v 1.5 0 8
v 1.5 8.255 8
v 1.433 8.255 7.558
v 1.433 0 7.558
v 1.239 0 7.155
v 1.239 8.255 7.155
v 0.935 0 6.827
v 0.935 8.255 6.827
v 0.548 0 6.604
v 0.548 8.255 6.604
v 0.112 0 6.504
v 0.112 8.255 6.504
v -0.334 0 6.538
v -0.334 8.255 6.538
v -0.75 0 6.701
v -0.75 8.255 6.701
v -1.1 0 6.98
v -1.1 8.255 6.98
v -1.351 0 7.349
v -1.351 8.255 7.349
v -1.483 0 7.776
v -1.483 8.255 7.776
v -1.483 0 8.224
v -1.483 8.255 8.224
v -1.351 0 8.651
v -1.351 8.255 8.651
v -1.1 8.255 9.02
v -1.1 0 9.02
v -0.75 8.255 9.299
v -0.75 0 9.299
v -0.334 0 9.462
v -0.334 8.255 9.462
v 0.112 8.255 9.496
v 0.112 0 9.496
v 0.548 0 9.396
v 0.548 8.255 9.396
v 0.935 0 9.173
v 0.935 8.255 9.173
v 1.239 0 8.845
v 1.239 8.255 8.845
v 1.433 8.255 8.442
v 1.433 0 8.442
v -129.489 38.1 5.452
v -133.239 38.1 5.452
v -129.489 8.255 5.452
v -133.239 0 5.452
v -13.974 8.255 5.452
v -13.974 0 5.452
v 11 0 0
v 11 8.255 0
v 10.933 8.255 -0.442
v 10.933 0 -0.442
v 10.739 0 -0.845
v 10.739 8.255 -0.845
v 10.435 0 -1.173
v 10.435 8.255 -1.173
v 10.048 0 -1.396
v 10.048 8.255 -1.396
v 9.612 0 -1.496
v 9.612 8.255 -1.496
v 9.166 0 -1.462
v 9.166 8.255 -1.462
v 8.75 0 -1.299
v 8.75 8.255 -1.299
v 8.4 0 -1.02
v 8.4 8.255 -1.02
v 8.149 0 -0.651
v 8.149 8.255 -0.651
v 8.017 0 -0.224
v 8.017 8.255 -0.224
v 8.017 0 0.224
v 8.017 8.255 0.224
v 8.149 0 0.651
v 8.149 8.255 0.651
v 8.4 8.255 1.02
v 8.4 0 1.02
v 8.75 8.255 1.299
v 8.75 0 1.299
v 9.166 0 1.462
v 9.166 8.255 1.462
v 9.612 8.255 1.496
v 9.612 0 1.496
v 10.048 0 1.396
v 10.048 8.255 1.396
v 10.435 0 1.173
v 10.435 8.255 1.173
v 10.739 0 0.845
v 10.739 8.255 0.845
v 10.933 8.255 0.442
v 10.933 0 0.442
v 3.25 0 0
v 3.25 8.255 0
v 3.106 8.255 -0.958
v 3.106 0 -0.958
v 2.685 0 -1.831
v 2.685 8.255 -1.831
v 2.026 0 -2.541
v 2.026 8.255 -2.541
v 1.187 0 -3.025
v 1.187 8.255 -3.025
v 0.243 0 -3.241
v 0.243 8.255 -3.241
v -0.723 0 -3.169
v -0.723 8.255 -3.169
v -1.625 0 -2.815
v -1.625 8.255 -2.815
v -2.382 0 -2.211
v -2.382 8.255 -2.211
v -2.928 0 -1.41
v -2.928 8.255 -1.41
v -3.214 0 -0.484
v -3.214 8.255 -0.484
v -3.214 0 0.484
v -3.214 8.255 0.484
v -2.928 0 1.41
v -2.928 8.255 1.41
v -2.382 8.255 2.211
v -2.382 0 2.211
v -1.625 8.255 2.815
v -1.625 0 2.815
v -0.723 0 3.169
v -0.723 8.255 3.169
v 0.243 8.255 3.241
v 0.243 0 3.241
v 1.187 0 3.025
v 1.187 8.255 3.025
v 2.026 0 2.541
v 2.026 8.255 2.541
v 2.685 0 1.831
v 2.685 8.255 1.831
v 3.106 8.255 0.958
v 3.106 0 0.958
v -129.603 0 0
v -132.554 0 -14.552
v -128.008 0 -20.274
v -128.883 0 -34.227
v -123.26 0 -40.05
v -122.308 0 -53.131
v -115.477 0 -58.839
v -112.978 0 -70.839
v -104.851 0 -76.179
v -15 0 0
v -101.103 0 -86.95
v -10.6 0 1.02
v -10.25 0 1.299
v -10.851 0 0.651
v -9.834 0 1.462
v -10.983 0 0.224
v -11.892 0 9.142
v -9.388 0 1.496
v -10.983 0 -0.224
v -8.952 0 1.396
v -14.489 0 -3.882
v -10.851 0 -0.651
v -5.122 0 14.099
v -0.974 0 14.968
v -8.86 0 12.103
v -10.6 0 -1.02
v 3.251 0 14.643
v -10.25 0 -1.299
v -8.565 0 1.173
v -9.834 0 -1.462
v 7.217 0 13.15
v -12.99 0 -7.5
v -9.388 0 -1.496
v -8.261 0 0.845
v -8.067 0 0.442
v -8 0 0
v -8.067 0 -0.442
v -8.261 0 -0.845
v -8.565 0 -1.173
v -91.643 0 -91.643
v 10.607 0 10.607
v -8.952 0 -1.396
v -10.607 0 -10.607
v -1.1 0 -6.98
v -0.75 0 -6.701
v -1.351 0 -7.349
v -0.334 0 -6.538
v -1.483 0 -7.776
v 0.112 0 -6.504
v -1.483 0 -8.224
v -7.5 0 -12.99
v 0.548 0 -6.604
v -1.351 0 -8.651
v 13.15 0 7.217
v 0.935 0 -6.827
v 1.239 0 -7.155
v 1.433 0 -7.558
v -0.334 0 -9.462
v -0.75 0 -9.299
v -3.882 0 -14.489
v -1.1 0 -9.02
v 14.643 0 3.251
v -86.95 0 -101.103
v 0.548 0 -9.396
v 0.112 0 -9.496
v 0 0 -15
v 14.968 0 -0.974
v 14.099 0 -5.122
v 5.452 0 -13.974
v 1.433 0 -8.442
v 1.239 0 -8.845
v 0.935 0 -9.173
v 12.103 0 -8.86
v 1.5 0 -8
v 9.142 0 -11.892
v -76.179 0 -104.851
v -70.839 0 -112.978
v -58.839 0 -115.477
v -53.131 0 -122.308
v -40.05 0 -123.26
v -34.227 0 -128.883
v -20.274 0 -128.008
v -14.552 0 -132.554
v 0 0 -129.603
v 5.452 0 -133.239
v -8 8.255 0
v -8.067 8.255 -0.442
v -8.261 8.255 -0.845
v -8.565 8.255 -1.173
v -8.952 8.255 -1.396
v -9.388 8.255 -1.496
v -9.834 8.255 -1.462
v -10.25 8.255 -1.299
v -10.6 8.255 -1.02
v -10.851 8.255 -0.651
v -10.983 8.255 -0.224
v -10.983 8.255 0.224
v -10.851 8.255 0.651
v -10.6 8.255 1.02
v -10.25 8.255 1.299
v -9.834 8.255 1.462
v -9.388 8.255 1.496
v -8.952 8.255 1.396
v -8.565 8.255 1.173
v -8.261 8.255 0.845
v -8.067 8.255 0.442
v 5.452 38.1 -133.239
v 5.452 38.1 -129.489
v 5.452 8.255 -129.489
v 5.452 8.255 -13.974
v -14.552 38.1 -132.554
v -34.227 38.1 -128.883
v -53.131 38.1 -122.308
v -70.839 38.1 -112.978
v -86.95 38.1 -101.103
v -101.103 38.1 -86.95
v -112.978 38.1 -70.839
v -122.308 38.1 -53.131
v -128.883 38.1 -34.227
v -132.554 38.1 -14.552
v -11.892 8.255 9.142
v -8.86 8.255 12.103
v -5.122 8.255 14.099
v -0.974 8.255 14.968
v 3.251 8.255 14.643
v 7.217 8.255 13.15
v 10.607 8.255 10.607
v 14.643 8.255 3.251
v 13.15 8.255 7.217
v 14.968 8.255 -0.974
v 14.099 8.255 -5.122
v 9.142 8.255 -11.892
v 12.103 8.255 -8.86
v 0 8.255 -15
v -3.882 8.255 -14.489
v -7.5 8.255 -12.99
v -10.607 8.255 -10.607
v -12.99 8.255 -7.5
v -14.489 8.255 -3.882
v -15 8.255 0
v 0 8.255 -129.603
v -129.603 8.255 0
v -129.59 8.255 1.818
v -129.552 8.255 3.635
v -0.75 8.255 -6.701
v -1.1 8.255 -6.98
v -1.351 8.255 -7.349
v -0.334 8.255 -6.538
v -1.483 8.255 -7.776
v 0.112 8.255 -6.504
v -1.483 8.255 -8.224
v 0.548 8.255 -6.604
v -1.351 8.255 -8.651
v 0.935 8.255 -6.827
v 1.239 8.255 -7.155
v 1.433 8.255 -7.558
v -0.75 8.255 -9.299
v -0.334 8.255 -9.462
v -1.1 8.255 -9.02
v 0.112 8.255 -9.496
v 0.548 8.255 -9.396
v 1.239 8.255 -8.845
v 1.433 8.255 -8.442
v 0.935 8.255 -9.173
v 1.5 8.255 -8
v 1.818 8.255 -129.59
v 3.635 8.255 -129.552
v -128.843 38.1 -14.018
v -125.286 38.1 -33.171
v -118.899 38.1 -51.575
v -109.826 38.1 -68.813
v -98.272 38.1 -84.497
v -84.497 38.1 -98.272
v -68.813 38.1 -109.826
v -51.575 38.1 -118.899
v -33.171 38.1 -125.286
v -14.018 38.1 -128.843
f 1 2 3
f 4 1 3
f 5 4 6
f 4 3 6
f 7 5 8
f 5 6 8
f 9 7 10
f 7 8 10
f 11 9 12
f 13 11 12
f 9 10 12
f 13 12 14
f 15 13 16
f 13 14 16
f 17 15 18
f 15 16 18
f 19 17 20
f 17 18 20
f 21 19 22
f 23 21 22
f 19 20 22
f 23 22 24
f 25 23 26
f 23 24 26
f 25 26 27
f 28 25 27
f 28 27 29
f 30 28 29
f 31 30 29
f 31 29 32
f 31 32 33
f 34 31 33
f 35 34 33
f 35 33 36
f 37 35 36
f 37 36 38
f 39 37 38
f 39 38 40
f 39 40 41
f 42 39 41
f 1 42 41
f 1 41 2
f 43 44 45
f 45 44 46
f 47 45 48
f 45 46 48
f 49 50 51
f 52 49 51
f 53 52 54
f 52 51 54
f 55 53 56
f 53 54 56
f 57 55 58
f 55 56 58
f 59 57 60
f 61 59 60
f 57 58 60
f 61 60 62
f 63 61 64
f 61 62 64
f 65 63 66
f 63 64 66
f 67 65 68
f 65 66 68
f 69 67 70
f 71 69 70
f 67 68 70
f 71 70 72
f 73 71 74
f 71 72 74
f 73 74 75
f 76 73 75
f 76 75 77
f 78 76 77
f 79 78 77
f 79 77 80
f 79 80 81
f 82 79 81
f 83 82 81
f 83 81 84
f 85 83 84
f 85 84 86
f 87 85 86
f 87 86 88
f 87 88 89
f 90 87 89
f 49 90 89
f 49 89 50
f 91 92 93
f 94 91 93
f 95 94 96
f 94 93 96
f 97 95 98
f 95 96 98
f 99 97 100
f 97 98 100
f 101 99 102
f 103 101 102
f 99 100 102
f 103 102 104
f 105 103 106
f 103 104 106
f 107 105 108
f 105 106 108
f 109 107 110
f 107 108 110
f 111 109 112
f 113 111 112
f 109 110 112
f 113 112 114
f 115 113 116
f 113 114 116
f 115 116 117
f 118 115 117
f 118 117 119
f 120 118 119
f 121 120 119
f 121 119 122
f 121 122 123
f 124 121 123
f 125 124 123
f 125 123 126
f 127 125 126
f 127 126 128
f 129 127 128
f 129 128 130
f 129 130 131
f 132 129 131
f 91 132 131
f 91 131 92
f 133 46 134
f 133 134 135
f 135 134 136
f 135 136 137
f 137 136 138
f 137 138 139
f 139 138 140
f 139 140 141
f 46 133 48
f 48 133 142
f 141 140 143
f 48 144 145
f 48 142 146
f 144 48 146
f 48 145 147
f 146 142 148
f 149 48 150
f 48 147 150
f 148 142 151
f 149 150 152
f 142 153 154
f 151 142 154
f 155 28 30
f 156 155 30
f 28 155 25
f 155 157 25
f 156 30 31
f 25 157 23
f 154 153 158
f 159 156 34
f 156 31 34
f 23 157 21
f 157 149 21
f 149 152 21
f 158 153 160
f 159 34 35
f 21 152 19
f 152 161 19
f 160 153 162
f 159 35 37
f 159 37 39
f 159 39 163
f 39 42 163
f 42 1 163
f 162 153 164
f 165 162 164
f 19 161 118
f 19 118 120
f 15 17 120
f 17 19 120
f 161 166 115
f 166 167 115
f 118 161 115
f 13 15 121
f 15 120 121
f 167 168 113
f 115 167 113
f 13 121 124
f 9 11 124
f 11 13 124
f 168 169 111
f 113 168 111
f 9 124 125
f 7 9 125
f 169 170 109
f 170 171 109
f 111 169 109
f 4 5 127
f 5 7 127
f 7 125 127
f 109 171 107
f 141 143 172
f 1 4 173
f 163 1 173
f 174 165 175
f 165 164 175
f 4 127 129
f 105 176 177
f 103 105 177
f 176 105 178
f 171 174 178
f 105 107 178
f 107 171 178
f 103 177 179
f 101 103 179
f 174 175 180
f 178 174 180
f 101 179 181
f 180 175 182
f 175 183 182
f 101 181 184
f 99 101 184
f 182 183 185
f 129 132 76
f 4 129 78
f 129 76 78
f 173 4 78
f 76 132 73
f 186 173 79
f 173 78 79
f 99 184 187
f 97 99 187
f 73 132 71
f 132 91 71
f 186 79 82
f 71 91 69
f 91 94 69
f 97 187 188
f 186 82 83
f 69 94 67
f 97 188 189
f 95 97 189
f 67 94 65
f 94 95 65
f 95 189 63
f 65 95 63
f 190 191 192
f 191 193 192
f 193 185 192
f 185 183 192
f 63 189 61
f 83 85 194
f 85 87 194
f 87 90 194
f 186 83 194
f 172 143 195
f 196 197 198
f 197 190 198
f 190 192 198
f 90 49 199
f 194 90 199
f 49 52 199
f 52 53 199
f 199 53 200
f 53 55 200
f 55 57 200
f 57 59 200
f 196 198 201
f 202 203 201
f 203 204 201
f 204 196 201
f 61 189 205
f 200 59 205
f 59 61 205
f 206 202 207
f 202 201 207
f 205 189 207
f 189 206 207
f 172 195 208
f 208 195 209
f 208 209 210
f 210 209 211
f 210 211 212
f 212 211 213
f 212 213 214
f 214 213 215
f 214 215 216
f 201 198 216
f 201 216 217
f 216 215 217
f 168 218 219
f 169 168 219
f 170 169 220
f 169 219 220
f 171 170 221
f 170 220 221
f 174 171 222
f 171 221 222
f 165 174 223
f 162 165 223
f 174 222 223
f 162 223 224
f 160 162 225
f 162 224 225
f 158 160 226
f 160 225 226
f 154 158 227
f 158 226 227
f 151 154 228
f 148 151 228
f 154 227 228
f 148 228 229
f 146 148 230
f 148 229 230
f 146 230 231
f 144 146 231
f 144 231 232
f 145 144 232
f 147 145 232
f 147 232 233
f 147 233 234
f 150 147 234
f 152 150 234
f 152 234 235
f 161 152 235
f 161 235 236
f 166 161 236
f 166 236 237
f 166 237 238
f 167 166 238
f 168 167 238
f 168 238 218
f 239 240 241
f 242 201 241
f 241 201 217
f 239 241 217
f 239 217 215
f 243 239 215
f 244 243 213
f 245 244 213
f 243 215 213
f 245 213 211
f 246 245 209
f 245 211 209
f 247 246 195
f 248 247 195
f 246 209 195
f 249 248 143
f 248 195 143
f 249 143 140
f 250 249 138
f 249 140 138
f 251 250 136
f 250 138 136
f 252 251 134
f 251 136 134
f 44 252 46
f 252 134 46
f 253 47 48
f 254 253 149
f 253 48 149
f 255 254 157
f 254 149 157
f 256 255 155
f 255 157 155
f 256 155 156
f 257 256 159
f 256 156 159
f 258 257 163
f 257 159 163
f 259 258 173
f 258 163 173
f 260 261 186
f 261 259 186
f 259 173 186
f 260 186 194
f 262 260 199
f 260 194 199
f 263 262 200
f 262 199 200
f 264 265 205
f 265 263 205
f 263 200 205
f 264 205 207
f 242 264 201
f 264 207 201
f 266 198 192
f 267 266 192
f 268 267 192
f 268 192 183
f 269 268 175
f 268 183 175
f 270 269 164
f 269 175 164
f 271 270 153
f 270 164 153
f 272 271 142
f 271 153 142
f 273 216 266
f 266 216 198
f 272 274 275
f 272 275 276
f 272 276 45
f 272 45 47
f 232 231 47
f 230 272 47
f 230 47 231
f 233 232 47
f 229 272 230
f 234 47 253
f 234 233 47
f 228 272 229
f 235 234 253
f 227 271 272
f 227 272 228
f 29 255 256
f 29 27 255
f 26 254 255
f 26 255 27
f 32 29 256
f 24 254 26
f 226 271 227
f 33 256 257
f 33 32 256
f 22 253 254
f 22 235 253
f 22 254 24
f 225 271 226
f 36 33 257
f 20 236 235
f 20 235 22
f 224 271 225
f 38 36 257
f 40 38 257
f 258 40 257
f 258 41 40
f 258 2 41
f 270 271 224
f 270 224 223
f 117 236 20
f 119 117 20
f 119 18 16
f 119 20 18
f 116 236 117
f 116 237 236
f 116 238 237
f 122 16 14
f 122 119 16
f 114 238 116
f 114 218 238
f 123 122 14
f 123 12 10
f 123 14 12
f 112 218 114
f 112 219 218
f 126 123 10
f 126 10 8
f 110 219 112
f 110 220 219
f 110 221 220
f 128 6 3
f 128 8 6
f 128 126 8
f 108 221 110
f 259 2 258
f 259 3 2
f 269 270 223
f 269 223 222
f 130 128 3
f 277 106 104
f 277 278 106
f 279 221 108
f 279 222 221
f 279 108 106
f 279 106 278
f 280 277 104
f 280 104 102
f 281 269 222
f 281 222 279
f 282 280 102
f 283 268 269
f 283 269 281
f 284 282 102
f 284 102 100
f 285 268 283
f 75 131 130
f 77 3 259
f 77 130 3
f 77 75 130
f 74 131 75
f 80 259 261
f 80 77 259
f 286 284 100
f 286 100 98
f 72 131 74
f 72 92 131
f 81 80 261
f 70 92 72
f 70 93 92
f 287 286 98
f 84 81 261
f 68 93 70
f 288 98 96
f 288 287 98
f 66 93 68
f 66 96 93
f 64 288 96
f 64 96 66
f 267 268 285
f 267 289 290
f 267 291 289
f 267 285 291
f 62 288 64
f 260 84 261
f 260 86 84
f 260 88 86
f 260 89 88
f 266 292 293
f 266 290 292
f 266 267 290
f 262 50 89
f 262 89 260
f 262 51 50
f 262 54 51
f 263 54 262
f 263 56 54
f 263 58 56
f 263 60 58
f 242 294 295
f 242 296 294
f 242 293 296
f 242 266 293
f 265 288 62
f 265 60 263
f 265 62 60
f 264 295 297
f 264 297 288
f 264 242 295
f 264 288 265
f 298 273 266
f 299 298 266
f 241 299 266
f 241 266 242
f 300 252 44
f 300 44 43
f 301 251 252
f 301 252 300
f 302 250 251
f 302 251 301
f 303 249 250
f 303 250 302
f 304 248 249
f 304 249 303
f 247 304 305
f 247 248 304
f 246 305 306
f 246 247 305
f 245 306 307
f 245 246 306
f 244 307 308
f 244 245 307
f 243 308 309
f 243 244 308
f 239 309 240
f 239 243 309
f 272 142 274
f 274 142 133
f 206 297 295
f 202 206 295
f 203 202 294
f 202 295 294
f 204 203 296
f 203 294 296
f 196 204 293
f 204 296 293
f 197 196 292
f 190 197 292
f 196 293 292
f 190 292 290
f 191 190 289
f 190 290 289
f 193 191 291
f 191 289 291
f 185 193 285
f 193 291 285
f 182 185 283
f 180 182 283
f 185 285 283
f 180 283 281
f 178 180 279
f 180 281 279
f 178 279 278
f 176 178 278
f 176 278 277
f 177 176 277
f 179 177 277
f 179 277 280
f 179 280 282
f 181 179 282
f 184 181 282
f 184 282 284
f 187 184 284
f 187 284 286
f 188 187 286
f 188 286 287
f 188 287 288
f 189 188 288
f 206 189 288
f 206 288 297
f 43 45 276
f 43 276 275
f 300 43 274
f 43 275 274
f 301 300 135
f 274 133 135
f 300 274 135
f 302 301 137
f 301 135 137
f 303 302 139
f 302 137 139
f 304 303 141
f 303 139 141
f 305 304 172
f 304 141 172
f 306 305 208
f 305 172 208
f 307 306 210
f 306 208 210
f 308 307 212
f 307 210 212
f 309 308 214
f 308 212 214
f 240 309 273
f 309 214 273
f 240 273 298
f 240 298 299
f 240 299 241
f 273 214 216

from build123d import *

# Parameters (mm, degrees)
SKETCH1_R           = 15
BOSS_EXTRUDE2_DEPTH = 8.255
BOSS_EXTRUDE3_DEPTH = 8.255
BOSS_EXTRUDE4_DEPTH = 38.1
SKETCH5_R           = 1.500000048
SKETCH5_R_2         = 1.5
SKETCH5_R_3         = 3.249999977
CUT_EXTRUDE3_DEPTH  = 63.5


with BuildPart() as part:
    # Sketch1 → Boss-Extrude2 (new body)
    with BuildSketch(Plane(origin=(0, 0, 0), x_dir=(1, 0, 0), z_dir=(0, 1, 0))):
        Circle(SKETCH1_R)
    extrude(amount=BOSS_EXTRUDE2_DEPTH)

    # Sketch1<6> → Boss-Extrude3 (add)
    with BuildSketch(Plane(origin=(0, 0, 0), x_dir=(1, 0, 0), z_dir=(0, 1, 0))):
        with BuildLine():
            ThreePointArc((5.451587957, 129.488518037), (2.726397307, 129.574545619), (0, 129.603225711))
            Line((0, 129.603225711), (0, 15))
            ThreePointArc((0, 15), (2.773622889, 14.741336984), (5.451587957, 13.974268809))
            Line((5.451587957, 13.974268809), (5.451587957, 129.488518037))
        make_face()
        with BuildLine():
            Line((-15, 0), (-129.603225711, 0))
            ThreePointArc((-129.603225711, 0), (-129.574545619, -2.726397307), (-129.488518037, -5.451587957))
            Line((-129.488518037, -5.451587957), (-13.974268809, -5.451587957))
            ThreePointArc((-13.974268809, -5.451587957), (-14.741336984, -2.773622889), (-15, 0))
        make_face()
    extrude(amount=BOSS_EXTRUDE3_DEPTH)

    # Sketch1<7> → Boss-Extrude4 (add)
    with BuildSketch(Plane(origin=(0, 0, 0), x_dir=(1, 0, 0), z_dir=(0, 1, 0))):
        with BuildLine():
            ThreePointArc((-129.603225711, 0), (-91.643319764, 91.643319764), (0, 129.603225711))
            ThreePointArc((0, 129.603225711), (2.726397307, 129.574545619), (5.451587957, 129.488518037))
            Line((5.451587957, 129.488518037), (5.451587957, 133.238518037))
            ThreePointArc((5.451587957, 133.238518037), (-94.292689271, 94.292689271), (-133.238518037, -5.451587957))
            Line((-133.238518037, -5.451587957), (-129.488518037, -5.451587957))
            ThreePointArc((-129.488518037, -5.451587957), (-129.574545619, -2.726397307), (-129.603225711, 0))
        make_face()
    extrude(amount=BOSS_EXTRUDE4_DEPTH)

    # Sketch5 → Cut-Extrude3 (cut)
    with BuildSketch(Plane(origin=(0, 8.255, 0), x_dir=(1, 0, 0), z_dir=(0, 1, 0))):
        with Locations((-9.5, 0)):
            Circle(SKETCH5_R)
        with Locations((0, 8)):
            Circle(SKETCH5_R_2)
        with Locations((0, -8)):
            Circle(SKETCH5_R_2)
        with Locations((9.5, 0)):
            Circle(SKETCH5_R)
        Circle(SKETCH5_R_3)
    extrude(amount=-CUT_EXTRUDE3_DEPTH, mode=Mode.SUBTRACT)


solid = part.part
